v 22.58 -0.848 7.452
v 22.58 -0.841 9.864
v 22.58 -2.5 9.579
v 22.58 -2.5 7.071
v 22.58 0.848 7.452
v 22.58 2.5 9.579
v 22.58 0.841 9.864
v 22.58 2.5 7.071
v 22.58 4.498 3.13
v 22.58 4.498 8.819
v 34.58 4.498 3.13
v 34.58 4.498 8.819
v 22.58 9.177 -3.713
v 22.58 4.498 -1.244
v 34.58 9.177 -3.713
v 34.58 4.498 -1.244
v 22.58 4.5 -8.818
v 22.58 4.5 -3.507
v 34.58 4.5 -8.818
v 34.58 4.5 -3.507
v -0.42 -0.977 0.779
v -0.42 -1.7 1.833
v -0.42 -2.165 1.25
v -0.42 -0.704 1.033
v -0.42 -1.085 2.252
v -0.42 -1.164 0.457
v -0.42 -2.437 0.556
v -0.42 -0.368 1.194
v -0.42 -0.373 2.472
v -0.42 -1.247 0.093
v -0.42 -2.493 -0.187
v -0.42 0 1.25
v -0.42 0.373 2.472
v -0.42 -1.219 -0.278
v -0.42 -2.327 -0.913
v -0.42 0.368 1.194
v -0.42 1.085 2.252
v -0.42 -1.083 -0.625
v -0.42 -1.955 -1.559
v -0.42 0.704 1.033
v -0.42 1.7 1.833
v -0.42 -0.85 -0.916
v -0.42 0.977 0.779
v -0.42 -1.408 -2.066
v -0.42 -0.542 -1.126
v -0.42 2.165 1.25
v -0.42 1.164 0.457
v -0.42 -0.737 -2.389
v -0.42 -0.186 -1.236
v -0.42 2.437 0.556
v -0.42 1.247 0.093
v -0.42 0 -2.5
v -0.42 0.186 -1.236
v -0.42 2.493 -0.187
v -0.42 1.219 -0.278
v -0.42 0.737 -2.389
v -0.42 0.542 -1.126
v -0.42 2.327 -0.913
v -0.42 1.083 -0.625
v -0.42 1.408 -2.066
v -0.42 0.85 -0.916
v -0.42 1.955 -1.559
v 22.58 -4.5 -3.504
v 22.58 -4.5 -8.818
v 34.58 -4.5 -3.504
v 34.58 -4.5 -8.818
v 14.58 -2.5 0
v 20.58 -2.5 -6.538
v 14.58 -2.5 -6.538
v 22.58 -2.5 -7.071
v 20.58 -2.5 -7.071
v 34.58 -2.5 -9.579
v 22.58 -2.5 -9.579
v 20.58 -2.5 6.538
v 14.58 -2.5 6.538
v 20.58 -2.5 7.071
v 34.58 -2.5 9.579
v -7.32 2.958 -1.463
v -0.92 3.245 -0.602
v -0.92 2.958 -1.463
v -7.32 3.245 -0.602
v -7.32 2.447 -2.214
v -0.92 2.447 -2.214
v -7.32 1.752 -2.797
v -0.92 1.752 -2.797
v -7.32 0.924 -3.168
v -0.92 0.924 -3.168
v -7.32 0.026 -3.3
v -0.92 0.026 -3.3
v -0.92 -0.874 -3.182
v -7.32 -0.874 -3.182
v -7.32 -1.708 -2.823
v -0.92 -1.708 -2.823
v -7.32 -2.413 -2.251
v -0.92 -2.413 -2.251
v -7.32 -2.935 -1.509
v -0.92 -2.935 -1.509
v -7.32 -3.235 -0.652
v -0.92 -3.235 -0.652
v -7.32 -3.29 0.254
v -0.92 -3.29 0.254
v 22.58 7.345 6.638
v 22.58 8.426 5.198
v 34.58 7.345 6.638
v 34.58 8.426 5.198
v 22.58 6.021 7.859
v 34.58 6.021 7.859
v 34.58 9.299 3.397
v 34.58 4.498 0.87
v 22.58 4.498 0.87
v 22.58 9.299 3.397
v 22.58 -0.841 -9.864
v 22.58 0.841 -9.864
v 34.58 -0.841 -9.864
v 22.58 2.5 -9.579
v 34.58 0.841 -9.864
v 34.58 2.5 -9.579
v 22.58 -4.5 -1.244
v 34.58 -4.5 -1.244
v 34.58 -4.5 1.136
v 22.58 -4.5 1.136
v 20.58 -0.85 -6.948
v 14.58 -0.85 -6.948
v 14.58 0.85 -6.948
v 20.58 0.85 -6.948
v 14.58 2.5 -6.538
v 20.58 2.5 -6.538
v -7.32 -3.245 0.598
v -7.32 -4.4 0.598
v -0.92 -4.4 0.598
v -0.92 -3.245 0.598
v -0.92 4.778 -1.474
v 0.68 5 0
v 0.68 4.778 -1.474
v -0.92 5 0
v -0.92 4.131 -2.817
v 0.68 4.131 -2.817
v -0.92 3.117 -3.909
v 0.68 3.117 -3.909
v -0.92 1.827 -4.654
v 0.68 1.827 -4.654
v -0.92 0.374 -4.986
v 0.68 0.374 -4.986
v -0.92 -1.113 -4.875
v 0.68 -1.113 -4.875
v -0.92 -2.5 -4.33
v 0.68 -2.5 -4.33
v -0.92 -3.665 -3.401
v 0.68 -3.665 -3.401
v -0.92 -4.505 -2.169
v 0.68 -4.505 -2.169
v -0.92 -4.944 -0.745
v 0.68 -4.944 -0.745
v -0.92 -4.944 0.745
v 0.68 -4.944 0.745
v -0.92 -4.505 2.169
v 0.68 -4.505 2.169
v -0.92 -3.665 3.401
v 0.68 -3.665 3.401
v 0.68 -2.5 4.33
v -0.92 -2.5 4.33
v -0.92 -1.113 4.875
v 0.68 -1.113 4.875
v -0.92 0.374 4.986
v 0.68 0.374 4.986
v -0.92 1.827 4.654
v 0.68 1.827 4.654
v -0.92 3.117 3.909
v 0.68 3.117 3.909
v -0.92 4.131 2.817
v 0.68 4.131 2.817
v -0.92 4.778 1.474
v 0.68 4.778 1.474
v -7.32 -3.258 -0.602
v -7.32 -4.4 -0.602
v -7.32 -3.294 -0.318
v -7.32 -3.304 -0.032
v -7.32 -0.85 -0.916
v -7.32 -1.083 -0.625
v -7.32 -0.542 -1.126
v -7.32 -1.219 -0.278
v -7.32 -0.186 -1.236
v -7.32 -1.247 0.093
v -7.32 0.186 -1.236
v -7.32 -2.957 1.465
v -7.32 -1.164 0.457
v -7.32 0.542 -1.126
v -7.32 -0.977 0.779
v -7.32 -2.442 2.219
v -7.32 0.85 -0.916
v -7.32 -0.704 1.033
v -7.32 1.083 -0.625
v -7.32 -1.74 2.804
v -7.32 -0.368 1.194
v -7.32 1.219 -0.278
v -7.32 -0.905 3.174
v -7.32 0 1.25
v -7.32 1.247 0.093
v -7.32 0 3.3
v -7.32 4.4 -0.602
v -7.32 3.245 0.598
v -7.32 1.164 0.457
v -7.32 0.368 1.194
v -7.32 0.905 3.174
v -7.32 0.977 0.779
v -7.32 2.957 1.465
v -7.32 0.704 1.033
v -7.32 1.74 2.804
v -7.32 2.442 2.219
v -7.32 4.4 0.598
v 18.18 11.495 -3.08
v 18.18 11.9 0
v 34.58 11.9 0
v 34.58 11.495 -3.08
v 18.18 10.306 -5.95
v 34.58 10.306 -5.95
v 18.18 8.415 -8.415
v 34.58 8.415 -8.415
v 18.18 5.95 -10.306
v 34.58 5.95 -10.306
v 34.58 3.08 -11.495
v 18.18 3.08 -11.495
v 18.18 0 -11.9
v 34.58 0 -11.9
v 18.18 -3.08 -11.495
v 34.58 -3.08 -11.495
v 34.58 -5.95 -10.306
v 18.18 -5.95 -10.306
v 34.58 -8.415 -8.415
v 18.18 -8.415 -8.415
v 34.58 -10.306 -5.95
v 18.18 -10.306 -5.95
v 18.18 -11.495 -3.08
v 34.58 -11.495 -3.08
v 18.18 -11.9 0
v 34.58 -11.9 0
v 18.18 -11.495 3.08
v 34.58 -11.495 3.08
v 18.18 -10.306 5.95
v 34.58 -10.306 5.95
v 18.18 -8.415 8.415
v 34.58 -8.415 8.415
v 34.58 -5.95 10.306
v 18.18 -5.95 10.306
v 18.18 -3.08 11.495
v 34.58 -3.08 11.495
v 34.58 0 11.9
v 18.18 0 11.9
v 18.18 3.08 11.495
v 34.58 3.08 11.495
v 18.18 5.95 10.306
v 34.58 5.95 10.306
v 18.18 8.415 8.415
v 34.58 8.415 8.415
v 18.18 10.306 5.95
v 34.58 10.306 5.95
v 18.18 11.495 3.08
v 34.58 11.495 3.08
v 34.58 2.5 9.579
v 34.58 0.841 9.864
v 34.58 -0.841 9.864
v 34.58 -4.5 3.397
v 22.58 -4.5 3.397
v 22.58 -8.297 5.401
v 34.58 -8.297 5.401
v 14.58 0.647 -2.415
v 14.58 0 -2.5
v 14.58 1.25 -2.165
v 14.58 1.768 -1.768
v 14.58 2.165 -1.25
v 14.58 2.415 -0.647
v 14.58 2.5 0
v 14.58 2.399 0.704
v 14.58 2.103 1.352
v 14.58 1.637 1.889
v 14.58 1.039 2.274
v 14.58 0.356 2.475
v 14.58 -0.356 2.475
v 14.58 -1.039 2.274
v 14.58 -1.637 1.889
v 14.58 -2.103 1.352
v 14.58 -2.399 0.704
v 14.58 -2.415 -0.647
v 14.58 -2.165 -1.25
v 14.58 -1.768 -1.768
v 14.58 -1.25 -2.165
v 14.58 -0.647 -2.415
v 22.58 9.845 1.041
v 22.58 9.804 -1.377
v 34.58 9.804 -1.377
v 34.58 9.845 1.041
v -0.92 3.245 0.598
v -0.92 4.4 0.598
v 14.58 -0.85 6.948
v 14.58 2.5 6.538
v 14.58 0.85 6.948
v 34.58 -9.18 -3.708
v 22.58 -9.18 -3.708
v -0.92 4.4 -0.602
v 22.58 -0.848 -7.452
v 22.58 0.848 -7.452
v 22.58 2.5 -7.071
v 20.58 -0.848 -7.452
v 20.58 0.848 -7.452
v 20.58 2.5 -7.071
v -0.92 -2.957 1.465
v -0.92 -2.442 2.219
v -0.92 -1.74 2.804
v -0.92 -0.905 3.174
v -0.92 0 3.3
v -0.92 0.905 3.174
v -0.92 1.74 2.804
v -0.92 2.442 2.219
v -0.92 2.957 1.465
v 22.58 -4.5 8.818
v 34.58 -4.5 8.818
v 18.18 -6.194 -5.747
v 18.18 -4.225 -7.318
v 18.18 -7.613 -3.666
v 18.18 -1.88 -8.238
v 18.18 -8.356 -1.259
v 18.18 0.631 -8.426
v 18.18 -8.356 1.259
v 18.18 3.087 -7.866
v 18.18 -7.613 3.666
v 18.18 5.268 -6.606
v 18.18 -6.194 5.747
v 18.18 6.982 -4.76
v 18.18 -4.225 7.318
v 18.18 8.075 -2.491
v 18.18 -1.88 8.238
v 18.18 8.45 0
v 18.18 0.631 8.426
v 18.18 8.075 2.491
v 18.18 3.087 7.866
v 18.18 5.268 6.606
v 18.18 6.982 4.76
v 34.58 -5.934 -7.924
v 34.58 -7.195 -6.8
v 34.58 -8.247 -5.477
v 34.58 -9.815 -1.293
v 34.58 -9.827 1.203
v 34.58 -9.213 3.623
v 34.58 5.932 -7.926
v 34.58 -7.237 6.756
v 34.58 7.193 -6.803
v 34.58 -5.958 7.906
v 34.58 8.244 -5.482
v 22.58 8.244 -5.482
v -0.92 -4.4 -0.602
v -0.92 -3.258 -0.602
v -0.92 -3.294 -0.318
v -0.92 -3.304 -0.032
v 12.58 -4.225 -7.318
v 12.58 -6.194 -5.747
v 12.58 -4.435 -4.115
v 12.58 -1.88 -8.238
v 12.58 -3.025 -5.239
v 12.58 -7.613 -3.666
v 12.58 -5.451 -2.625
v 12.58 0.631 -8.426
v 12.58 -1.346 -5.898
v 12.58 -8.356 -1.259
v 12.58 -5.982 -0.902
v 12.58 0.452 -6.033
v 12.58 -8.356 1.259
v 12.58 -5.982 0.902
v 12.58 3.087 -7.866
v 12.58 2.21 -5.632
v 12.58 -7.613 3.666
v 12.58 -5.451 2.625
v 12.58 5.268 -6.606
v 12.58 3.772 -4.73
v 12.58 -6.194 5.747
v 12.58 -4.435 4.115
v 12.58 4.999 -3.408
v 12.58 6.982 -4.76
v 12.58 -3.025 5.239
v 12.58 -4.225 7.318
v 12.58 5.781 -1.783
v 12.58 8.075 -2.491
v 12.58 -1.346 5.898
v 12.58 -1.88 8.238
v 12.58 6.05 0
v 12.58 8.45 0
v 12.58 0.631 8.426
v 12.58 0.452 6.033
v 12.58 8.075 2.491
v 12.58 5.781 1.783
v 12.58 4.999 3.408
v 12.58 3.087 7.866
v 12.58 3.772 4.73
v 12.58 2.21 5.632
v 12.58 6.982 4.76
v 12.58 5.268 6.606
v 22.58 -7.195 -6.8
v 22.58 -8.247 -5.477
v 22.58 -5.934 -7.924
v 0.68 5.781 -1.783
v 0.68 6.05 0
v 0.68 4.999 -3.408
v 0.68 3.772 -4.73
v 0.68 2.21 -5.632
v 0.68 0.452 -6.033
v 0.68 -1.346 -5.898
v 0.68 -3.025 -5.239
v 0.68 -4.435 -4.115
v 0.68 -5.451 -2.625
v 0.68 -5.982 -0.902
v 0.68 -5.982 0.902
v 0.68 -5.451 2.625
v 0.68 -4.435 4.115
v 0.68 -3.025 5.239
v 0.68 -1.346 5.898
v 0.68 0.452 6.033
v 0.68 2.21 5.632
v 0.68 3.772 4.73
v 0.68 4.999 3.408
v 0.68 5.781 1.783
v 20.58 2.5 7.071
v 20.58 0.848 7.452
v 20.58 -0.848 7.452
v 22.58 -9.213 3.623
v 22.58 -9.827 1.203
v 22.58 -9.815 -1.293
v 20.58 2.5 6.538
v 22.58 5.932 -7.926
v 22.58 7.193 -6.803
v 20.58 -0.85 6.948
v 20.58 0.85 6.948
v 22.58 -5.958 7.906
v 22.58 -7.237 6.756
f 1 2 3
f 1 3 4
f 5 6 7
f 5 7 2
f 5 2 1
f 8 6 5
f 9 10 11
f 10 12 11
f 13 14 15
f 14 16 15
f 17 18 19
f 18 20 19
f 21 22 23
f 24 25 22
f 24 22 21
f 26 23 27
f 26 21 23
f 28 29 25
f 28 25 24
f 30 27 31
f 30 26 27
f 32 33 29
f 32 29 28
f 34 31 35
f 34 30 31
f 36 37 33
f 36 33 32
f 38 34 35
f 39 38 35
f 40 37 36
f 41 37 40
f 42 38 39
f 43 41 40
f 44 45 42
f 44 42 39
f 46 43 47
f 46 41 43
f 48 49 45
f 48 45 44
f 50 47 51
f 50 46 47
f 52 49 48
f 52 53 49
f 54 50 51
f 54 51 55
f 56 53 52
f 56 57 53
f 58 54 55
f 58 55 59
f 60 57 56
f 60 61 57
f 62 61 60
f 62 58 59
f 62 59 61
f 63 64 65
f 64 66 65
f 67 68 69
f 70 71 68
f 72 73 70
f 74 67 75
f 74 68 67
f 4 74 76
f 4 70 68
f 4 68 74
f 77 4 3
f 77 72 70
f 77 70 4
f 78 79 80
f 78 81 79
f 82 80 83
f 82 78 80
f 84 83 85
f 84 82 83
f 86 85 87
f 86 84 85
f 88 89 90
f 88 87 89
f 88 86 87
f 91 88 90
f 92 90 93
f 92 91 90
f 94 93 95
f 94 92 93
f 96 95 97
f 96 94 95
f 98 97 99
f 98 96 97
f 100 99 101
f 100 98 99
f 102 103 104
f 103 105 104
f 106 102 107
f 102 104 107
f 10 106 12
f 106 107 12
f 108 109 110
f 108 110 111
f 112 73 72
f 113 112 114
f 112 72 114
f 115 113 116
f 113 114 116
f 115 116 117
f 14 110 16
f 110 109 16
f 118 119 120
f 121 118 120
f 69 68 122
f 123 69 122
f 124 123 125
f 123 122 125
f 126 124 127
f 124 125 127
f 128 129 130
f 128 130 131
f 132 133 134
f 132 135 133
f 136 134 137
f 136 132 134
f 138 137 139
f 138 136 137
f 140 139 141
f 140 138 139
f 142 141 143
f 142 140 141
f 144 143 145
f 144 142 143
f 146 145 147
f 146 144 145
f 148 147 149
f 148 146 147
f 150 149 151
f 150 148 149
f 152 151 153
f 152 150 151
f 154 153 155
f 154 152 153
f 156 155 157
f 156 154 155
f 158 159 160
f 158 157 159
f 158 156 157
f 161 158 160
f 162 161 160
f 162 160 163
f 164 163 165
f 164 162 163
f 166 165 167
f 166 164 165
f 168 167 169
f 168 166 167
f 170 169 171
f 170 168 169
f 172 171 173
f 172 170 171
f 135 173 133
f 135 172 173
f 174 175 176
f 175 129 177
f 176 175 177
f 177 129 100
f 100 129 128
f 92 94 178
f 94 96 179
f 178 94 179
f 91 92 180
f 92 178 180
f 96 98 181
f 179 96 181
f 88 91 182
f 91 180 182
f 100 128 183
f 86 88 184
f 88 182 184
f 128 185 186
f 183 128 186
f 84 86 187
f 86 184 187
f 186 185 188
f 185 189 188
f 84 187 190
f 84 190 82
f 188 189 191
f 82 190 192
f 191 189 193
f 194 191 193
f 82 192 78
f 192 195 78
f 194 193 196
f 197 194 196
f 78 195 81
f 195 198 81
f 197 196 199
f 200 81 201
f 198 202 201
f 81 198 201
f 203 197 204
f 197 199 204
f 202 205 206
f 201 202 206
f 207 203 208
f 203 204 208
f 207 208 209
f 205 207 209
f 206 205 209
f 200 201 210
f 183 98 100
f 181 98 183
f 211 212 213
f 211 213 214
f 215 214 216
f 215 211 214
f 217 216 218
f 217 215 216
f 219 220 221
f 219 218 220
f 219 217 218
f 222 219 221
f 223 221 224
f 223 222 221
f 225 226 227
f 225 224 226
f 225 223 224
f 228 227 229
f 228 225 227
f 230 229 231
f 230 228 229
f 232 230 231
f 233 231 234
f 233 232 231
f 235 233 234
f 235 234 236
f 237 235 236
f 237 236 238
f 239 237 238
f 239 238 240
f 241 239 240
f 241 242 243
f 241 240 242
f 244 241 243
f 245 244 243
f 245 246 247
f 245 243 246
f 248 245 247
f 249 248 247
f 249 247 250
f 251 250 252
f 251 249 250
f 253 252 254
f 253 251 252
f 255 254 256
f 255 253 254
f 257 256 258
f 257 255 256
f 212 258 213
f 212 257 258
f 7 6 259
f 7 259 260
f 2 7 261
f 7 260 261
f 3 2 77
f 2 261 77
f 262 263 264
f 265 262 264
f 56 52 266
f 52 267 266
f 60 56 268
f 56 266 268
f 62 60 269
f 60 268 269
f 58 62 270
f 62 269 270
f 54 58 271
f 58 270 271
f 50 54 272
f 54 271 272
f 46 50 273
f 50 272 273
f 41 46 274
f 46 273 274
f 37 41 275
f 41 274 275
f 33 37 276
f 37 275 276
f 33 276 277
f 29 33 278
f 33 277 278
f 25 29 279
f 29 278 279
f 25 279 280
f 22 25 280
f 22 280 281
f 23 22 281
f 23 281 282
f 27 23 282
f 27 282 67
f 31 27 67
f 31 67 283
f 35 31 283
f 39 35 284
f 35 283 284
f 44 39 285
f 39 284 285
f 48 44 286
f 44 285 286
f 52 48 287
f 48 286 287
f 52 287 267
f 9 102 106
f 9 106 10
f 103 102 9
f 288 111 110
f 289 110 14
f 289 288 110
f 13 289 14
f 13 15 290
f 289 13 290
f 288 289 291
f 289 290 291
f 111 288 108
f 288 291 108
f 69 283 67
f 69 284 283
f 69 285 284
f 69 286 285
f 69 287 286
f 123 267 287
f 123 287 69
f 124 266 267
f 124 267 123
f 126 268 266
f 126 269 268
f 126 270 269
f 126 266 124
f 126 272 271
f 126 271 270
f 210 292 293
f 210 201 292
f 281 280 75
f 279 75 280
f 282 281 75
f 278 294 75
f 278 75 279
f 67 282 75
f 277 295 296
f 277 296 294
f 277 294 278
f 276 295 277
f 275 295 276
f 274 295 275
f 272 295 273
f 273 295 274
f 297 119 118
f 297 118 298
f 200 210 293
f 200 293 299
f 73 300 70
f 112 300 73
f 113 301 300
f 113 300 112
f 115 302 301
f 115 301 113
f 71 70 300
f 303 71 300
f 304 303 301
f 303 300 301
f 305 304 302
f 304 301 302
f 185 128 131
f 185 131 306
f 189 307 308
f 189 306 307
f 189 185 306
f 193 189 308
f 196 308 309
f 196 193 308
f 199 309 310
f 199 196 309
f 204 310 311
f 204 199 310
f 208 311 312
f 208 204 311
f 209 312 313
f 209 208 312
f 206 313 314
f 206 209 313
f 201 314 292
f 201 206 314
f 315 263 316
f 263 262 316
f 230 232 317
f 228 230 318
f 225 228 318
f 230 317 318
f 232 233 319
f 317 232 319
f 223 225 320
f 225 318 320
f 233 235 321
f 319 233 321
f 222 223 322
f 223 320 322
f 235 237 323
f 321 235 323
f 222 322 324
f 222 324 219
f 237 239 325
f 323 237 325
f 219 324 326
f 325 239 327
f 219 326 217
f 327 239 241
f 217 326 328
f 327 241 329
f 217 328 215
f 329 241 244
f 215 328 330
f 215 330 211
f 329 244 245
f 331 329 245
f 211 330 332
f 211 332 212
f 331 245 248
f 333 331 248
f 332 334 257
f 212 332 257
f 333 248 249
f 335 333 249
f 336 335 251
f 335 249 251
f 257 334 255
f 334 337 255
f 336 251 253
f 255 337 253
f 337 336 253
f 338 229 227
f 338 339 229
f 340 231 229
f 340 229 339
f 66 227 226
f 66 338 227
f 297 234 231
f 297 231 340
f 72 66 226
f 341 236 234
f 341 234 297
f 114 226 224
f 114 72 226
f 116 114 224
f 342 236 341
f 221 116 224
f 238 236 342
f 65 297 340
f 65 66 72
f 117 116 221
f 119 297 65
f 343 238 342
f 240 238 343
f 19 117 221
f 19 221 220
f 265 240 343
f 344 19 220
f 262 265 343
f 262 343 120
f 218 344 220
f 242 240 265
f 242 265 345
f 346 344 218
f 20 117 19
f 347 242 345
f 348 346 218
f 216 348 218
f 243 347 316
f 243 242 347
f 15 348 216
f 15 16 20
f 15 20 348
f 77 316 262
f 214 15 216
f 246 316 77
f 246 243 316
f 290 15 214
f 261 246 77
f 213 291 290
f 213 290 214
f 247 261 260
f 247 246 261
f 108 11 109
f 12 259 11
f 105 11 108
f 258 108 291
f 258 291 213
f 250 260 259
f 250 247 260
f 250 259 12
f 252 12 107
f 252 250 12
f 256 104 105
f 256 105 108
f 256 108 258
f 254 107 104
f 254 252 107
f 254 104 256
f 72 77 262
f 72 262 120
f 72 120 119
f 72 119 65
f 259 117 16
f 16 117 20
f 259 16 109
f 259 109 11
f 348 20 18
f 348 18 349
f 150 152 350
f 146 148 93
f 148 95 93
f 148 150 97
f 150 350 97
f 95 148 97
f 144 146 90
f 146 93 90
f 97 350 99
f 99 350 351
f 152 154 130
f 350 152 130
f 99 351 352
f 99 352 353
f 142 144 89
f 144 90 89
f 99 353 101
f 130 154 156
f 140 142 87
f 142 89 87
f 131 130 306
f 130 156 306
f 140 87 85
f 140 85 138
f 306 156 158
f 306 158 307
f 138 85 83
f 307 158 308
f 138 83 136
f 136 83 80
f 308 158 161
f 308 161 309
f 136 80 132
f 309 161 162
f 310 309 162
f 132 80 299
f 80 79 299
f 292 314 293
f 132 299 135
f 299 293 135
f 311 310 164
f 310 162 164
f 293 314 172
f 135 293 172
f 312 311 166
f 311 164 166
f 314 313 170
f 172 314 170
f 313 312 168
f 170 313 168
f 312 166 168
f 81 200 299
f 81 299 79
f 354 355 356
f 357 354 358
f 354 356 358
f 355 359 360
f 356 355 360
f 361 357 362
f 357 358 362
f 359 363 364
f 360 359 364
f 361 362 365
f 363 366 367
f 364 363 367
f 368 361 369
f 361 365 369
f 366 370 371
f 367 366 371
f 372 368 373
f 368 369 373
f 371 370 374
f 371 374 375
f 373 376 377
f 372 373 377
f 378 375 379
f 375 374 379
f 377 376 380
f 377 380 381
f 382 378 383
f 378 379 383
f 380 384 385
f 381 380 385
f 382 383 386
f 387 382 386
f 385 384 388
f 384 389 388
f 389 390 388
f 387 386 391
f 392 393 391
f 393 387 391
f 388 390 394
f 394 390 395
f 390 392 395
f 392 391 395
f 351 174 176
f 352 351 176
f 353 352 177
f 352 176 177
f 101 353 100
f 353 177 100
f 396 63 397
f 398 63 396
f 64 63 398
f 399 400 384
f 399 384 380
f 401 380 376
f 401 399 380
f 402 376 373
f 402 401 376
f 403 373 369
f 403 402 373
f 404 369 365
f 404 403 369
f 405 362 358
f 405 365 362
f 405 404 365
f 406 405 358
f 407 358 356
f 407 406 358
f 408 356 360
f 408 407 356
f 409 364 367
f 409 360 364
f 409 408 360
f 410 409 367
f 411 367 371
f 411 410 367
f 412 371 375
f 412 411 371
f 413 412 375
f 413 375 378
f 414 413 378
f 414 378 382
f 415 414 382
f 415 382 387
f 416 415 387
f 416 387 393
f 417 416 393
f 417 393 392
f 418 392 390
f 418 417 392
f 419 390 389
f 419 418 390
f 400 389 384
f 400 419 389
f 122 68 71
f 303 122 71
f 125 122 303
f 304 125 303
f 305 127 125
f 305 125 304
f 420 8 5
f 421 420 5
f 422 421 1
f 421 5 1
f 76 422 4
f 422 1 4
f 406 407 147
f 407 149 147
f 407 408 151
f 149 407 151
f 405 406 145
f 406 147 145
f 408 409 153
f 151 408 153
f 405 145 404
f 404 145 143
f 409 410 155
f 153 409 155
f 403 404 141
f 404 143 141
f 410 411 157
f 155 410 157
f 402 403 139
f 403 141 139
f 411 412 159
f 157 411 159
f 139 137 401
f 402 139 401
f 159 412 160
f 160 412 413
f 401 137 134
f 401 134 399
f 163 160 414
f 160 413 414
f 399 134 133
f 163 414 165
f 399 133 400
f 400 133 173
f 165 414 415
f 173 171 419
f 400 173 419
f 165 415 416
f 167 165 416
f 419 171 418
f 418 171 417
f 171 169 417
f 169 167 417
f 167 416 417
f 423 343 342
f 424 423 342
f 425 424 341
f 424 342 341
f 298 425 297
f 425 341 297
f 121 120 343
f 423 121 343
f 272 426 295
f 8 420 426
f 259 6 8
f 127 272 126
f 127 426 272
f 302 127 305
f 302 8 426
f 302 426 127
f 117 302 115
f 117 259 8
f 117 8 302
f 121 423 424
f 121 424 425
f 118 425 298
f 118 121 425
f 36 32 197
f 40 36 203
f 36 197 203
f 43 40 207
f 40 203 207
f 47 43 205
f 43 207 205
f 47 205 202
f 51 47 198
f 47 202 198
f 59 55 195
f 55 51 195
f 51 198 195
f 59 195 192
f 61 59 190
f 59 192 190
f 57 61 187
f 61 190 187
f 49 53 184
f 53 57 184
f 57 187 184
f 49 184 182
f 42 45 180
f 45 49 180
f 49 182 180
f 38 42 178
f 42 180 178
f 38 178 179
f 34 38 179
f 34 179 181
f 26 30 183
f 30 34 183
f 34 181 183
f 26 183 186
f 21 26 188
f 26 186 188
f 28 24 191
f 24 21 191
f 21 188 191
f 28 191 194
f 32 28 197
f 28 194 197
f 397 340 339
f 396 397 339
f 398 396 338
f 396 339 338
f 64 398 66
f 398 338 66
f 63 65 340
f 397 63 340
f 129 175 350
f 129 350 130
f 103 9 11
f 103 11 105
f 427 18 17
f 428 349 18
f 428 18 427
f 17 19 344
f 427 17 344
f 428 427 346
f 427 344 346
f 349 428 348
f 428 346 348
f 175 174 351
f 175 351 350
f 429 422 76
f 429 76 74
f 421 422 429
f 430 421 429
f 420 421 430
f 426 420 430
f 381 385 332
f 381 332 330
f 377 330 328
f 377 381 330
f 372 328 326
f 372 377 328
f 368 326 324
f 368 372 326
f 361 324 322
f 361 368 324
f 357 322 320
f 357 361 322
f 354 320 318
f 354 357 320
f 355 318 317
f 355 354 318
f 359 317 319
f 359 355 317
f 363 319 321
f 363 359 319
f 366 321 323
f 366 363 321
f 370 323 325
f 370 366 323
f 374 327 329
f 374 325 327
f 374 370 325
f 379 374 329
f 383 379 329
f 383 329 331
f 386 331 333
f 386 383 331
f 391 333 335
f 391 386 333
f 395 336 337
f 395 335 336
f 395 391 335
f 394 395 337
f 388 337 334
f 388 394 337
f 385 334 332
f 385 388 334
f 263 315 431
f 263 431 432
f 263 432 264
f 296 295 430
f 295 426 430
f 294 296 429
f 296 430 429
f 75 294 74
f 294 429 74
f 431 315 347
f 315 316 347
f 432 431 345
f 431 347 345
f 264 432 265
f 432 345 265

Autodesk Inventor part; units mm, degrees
ref_plane "YZ Plane" through (0, 0, 0) normal (1, 0, 0) x (0, 1, 0)
ref_plane "XZ Plane" through (0, 0, 0) normal (0, 1, 0) x (-1, 0, 0)
ref_plane "XY Plane" through (0, 0, 0) normal (0, 0, 1) x (1, 0, 0)
sketch "Sketch1" plane through (0, 0, 0) normal (0, 0, 1) x (1, 0, 0)
  line L0 (34.580292, 0) -> (34.580292, 11.9)
  line L1 (34.580292, 11.9) -> (28.380292, 11.9)
  line L2 (28.380292, 11.9) -> (18.180292, 11.9)
  line L3 (18.180292, 11.9) -> (18.180292, 8.45)
  line L4 (18.180292, 8.45) -> (12.580292, 8.45)
  line L5 (12.580292, 8.45) -> (12.580292, 6.05)
  line L6 (12.580292, 6.05) -> (0.680292, 6.05)
  line L7 (0.680292, 6.05) -> (0.680292, 5)
  line L8 (0.680292, 5) -> (-0.919708, 5)
  line L9 (-0.919708, 5) -> (-0.919708, 3.3)
  line L10 (-0.919708, 3.3) -> (-7.319708, 3.3)
  line L11 (-7.319708, 3.3) -> (-7.319708, 0)
  line L12 (-19.229424, 0) -> (45.657176, 0)
  line L13 (-7.319708, 0) -> (34.580292, 0)
  point P0 (0, 0)
  dimension "d0" = 11.9
  dimension "d1" = 6.2
  dimension "d2" = 10.2
  dimension "d3" = 3.45
  dimension "d4" = 5.6
  dimension "d5" = 2.4
  dimension "d6" = 11.9
  dimension "d7" = 1.05
  dimension "d8" = 1.6
  dimension "d9" = 1.7
  dimension "d54" = 6.4
revolve "Revolution1" add sketch "Sketch1" angle 360 about axis through (-19.229424, 0, 0) along (1, 0, 0)
sketch "Sketch2" plane through (-7.319708, 0, 0) normal (-1, 0, 0) x (0, 0, 1)
  circle A0 centre (0, 0) radius 3.3 projected
  circle A1 centre (0, 0) radius 1.25
  dimension "d12" = 2.5
extrude "Extrusion1" cut sketch "Sketch2" against normal through all contours A1
sketch "Sketch3" plane through (34.580292, 0, 0) normal (1, 0, 0) x (0, 0, -1)
  circle A0 centre (0, 0) radius 1.25
  circle A1 centre (0, 0) radius 11.9
  circle A2 centre (0, 0) radius 9.9
  line L0 (-9.579144, 2.5) -> (9.579144, 2.5)
  line L1 (1.244069, 4.49804) -> (3.713385, 9.177187)
  line L2 (3.506516, 4.5) -> (5.482105, 8.243575)
  line L3 (-0.869771, 4.49804) -> (-3.397213, 9.298868)
  line L4 (-3.130001, 4.49804) -> (-5.197777, 8.425741)
  line L5 (-8.819163, 4.49804) -> (-3.130001, 4.49804)
  line L6 (-0.869771, 4.49804) -> (1.244069, 4.49804)
  line L7 (3.506516, 4.5) -> (8.818163, 4.5)
  line L8 (-9.579144, -2.5) -> (9.579144, -2.5)
  line L9 (-3.397213, -4.5) -> (-5.400973, -8.296957)
  line L10 (-1.135801, -4.5) -> (-3.623092, -9.213208)
  line L11 (3.504299, -4.5) -> (5.476946, -8.247004)
  line L12 (1.244069, -4.5) -> (3.707642, -9.179509)
  line L13 (8.818163, -4.5) -> (3.504299, -4.5)
  line L14 (1.244069, -4.5) -> (-1.135801, -4.5)
  line L15 (-3.397213, -4.5) -> (-8.818163, -4.5)
  dimension "d16" = 19.8
  dimension "d15" = 23.8
  dimension "d18" = 2.5
  dimension "d19" = 2
  dimension "d20" = 2
  dimension "d24" = 2
  dimension "d25" = 2
  dimension "d26" = 2
  dimension "d28" = 2.5
extrude "Extrusion2" cut sketch "Sketch3" against normal blind 12 contours A2 L8 L0 | L7 L2 A2 | A2 L11 L13 | A2 L4 L5 | L15 L9 A2 | L1 L6 L3 A2 | A2 L10 L14 L12
sketch "Sketch4" plane through (-7.319708, 0, 0) normal (-1, 0, 0) x (0, 0, 1)
  circle A0 centre (0, 0) radius 1.25
  circle A1 centre (0, 0) radius 3.3
  line L0 (-0.602013, 3.244623) -> (-0.602013, 4.4)
  line L1 (0, 7.165541) -> (0, -7.239273)
  arc A2 (-0.602013, -3.258413) -> (0.597987, -3.239718) centre (-0.052561, -0.004477) ccw
  arc A3 (0.597987, 3.2259) -> (-0.602013, 3.244623) centre (-0.052561, -0.004477) ccw
  line L2 (-7.277237, 0) -> (-5, 0)
  line L3 (-3.3, 0) -> (3.3, 0)
  line L4 (5, 0) -> (7.340981, 0)
  line L5 (0.597987, 4.4) -> (0.597987, 3.2259)
  line L6 (-0.602013, 4.4) -> (0.597987, 4.4)
  line L7 (-0.602013, -4.4) -> (0.597987, -4.4)
  line L8 (-0.602013, -4.4) -> (-0.602013, -3.244623)
  line L9 (0.597987, -4.4) -> (0.597987, -3.239718)
  dimension "d32" = 0
  dimension "d40" = 4.4
  dimension "d42" = 1.2
  dimension "d44" = 1.2
sketch "Sketch4 outline for Extrusion3" plane through (-7.319708, 0, 0) normal (-1, 0, 0) x (0, 0, 1)
  line L0 (-0.602013, -3.258413) -> (-0.602013, -4.4)
  arc A0 (0.597987, -3.239718) -> (-0.602013, -3.258413) centre (-0.052561, -0.004477) cw
  line L1 (0.597987, -4.4) -> (0.597987, -3.239718)
  line L2 (-0.602013, -4.4) -> (0.597987, -4.4)
  line L3 (-0.602013, 4.4) -> (-0.602013, 3.244623)
  line L4 (0.597987, 4.4) -> (-0.602013, 4.4)
  line L5 (0.597987, 3.2259) -> (0.597987, 4.4)
  arc A1 (-0.602013, 3.244623) -> (0.597987, 3.2259) centre (-0.052561, -0.004477) cw
extrude "Extrusion3" add sketch "Sketch4 outline for Extrusion3" against normal blind 7
sketch "Sketch5" plane through (22.580292, 0, 0) normal (1, 0, 0) x (0, 0, -1)
  circle A0 centre (0, 0) radius 1.25
  line L0 (9.579144, 2.5) -> (-9.579144, 2.5)
  arc A1 (-9.579144, 2.5) -> (-9.579144, -2.5) centre (0, 0) ccw
  circle A2 centre (0, 0) radius 2.5
extrude "Extrusion4" cut sketch "Sketch5" against normal blind 23
sketch "Sketch7" plane through (34.580292, 0, 0) normal (1, 0, 0) x (0, 0, -1)
  line L0 (9.579144, -2.5) -> (-9.579144, -2.5)
  line L1 (-9.579144, 2.5) -> (9.579144, 2.5)
  circle A0 centre (0, 0) radius 11.9
  arc A1 (7.071068, -2.5) -> (7.071068, 2.5) centre (0, 0) ccw
  arc A2 (-7.071068, 2.5) -> (-7.071068, -2.5) centre (0, 0) ccw
  dimension "d49" = 7.5
  dimension "d50" = 7.5
extrude "Extrusion5" cut sketch "Sketch7" against normal blind 14 contours L0 A2 L1 A1
sketch "Sketch8" plane through (34.580292, 0, 0) normal (1, 0, 0) x (0, 0, -1)
  line L0 (9.579144, -2.5) -> (-9.579144, -2.5)
  line L1 (-9.579144, 2.5) -> (9.579144, 2.5)
  arc A0 (-7.071068, 2.5) -> (-7.071068, -2.5) centre (0, 0) ccw
  arc A1 (7.071068, -2.5) -> (7.071068, 2.5) centre (0, 0) ccw
  arc A2 (6.538348, -2.5) -> (6.538348, 2.5) centre (0, 0) ccw
  arc A3 (-6.538348, 2.5) -> (-6.538348, -2.5) centre (0, 0) ccw
extrude "Extrusion6" cut sketch "Sketch8" against normal blind 20 contours L0 A3 L1 A2
equation "\"d50\" = d49"
properties part number "DrivingShaft"
